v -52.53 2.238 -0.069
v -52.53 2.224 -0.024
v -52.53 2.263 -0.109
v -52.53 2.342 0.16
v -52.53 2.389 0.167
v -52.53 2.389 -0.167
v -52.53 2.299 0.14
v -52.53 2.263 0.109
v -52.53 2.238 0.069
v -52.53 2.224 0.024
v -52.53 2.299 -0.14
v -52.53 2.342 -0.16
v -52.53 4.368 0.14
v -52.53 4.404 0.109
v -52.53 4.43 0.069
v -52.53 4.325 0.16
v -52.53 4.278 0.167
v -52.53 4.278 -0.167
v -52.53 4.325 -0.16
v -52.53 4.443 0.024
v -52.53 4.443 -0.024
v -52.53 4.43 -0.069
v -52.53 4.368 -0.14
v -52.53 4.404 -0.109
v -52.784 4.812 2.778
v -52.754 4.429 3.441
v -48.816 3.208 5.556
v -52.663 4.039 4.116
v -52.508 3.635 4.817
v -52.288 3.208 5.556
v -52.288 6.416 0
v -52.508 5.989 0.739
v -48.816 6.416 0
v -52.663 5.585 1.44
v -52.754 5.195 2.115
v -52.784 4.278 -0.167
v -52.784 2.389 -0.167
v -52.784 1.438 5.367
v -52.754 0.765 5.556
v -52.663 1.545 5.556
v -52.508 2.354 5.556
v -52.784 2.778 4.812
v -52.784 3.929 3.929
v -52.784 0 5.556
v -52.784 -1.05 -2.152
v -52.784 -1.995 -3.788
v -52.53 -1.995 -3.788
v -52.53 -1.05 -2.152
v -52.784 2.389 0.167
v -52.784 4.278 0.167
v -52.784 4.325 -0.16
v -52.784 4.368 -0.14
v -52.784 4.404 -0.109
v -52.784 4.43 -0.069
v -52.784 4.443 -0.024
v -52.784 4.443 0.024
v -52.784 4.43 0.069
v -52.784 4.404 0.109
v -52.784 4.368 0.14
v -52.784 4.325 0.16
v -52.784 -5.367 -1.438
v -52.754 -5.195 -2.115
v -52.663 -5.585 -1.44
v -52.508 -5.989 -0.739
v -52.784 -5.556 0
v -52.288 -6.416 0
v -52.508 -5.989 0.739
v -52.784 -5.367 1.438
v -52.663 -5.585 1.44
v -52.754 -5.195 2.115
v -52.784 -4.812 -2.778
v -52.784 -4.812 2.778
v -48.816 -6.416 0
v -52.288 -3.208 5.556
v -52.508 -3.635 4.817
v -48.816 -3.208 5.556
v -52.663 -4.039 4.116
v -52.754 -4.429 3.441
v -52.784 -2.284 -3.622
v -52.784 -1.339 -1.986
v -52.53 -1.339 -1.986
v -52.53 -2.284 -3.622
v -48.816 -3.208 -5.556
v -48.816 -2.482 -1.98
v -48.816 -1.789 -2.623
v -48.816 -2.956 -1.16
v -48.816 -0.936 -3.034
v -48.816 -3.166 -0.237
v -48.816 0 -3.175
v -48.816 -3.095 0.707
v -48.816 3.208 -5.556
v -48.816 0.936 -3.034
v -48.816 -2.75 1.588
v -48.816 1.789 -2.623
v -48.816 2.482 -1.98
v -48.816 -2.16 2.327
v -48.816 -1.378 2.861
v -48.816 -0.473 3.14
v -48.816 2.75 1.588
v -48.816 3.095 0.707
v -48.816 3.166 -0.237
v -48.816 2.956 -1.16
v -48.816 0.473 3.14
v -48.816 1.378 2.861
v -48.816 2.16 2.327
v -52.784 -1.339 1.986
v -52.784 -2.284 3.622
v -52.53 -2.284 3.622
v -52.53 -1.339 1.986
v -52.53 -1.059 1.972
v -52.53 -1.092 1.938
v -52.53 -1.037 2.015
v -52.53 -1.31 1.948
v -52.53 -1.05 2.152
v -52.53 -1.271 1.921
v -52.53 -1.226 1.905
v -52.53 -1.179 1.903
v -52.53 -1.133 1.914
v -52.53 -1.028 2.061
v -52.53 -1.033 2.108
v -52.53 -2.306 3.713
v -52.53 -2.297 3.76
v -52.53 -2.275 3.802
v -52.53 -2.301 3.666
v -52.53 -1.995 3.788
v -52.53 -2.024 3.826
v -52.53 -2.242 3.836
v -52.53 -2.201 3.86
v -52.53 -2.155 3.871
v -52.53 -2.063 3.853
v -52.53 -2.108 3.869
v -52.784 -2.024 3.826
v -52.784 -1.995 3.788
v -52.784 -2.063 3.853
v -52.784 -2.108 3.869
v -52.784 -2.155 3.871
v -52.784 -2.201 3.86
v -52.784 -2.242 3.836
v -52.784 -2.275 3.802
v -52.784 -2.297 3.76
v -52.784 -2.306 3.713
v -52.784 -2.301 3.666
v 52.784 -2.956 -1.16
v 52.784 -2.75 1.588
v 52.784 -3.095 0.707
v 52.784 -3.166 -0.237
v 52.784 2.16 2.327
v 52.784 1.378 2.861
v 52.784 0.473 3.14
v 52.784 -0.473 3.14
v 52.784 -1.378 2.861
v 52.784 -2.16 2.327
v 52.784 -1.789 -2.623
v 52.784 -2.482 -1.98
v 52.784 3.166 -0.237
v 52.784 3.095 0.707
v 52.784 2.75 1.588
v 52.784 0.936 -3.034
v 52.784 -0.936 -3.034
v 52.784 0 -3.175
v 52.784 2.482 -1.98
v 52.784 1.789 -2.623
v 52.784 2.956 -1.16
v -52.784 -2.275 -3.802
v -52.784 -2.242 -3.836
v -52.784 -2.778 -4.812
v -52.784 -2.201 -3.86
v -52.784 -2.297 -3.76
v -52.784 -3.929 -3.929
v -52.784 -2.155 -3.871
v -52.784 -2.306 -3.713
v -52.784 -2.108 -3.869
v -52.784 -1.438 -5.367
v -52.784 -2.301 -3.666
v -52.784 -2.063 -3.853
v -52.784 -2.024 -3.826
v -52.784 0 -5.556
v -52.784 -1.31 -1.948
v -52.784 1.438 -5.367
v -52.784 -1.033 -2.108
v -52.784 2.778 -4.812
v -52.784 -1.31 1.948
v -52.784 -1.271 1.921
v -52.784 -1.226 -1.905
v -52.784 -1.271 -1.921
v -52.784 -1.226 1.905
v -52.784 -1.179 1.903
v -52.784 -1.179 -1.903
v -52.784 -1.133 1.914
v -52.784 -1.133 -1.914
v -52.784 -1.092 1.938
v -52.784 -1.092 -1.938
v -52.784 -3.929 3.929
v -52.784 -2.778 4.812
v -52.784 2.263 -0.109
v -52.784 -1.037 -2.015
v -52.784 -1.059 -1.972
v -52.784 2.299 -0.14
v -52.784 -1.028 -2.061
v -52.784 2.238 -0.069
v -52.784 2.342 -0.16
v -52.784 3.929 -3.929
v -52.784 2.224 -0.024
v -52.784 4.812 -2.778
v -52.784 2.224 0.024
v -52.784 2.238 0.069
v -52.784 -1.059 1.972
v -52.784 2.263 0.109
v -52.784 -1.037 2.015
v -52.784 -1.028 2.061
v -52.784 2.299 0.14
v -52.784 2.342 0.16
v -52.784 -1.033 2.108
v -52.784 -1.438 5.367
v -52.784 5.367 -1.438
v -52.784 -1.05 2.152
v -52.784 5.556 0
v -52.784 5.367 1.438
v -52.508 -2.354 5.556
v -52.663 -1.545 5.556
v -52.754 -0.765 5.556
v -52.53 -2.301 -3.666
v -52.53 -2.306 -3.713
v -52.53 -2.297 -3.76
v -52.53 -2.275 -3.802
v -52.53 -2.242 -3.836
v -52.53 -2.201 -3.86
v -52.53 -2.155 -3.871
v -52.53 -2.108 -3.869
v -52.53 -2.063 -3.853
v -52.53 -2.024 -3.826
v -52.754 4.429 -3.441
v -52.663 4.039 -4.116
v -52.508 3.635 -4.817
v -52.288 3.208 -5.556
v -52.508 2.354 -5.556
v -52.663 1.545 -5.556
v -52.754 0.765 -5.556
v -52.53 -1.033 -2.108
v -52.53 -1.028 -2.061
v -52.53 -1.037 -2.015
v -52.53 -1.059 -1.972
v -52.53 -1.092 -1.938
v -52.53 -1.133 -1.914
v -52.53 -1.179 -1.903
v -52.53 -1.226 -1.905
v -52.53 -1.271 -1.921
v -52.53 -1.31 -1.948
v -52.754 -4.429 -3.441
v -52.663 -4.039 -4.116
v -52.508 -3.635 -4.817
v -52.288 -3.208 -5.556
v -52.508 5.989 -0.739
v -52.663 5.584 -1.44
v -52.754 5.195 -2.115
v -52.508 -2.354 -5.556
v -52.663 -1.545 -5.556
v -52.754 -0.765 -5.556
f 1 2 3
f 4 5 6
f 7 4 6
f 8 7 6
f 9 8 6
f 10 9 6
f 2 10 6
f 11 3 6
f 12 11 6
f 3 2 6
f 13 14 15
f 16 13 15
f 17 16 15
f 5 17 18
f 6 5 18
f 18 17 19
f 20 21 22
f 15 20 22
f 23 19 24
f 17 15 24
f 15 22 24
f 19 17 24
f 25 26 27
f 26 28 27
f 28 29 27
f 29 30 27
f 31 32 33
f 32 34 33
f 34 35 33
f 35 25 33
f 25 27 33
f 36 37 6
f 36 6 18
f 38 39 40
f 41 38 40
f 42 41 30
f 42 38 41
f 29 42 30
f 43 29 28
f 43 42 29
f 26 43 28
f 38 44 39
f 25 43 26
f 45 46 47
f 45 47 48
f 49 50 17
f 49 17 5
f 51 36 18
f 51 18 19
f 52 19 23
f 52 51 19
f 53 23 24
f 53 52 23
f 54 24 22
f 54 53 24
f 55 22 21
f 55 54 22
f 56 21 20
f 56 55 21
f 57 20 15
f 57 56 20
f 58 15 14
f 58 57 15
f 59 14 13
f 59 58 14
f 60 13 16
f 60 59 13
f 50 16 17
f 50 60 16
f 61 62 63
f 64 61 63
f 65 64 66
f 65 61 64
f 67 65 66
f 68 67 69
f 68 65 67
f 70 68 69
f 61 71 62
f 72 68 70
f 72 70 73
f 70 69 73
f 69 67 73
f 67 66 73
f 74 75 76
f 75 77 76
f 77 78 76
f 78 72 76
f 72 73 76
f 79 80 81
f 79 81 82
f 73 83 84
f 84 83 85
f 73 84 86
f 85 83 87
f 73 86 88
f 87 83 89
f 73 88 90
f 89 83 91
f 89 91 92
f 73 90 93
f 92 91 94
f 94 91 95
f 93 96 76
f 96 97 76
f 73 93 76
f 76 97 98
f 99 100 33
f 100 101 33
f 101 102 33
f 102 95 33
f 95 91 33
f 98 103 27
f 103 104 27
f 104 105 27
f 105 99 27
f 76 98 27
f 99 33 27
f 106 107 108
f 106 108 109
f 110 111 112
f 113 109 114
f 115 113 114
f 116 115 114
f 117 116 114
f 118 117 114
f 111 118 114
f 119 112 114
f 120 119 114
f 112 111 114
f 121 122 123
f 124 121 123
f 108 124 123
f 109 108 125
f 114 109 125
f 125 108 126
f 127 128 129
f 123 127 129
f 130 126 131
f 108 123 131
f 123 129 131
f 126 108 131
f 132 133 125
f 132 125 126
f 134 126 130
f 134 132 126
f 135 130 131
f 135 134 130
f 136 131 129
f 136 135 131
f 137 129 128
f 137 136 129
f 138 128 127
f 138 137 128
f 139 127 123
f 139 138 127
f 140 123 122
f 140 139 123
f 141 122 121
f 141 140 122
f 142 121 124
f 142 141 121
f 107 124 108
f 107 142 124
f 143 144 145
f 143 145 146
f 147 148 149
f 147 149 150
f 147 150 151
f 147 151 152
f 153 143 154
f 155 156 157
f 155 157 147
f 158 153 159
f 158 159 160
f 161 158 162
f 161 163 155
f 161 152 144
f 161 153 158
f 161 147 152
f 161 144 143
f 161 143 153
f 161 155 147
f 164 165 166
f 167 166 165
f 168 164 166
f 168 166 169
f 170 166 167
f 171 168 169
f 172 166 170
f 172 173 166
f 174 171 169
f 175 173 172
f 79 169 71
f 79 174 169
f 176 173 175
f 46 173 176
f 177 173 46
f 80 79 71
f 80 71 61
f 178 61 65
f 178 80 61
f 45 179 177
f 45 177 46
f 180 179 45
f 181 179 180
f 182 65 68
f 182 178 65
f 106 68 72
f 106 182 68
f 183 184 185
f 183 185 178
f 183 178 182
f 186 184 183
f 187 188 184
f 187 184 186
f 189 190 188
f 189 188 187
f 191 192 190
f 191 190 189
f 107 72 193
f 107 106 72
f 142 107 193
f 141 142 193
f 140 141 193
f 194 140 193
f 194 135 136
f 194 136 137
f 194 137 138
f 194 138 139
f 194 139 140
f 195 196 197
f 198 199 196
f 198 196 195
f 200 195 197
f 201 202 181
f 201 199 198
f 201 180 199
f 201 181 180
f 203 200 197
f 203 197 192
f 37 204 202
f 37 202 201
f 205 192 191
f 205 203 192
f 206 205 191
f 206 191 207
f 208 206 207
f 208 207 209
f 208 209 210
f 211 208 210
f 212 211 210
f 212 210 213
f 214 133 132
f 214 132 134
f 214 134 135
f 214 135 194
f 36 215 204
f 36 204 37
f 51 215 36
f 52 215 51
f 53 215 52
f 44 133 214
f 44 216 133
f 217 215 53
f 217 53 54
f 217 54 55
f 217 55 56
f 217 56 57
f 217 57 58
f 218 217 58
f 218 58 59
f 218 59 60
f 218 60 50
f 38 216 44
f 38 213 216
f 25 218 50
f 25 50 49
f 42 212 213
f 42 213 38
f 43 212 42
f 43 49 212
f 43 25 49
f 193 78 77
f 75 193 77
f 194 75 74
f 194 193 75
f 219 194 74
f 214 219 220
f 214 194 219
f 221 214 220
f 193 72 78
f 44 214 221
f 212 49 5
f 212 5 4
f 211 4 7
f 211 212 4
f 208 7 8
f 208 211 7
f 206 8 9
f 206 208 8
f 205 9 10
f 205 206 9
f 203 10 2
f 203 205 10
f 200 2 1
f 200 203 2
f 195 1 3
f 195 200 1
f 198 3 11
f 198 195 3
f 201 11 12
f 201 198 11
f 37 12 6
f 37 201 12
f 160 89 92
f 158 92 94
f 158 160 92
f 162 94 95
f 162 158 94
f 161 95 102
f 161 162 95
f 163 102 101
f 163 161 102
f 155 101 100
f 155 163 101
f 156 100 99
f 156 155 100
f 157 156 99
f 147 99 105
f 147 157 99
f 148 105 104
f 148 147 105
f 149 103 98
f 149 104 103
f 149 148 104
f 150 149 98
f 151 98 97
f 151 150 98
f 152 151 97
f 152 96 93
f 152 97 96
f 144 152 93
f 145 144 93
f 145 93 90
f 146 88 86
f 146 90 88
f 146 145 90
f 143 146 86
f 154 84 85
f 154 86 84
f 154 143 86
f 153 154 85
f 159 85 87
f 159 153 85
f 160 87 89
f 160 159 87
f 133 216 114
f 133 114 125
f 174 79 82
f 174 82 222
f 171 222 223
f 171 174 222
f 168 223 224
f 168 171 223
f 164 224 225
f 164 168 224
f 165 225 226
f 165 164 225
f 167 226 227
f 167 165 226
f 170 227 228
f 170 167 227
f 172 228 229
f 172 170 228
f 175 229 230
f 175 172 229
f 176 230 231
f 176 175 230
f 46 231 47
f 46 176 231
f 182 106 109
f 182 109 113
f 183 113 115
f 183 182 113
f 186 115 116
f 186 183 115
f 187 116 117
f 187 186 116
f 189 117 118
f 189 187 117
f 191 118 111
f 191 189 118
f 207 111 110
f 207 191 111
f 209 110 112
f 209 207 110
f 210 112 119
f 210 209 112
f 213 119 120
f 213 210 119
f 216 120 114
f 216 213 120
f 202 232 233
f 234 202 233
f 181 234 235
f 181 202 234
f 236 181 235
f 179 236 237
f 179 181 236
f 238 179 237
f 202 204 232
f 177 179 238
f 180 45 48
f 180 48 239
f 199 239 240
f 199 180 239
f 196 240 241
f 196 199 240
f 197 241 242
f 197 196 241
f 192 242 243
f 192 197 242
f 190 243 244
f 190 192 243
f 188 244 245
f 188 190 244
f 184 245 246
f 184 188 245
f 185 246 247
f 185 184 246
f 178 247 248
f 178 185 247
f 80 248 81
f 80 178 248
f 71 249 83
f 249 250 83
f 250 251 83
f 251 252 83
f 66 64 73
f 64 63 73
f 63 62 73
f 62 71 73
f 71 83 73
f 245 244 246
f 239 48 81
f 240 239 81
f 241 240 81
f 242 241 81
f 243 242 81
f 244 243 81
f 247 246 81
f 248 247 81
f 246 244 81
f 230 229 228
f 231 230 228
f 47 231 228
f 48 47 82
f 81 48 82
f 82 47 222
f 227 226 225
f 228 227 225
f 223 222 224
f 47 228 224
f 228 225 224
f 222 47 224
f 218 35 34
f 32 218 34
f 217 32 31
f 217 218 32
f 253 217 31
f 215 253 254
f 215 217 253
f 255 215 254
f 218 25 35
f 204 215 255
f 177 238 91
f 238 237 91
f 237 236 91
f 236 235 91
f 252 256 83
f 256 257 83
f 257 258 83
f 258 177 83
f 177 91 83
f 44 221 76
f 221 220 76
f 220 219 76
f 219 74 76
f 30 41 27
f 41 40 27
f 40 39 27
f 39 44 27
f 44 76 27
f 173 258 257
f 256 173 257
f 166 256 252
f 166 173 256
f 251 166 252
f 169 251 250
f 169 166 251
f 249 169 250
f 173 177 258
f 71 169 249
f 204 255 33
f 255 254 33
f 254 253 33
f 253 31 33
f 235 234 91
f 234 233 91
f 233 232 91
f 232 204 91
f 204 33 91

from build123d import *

# Parameters (mm, degrees)
SKETCH5_R           = 3.175
BOSS_EXTRUDE3_DEPTH = 101.6
BOSS_EXTRUDE4_DEPTH = 3.96875
SKETCH8_OUTSIDE_W   = 404.842
SKETCH8_OUTSIDE_H   = 406.562
SKETCH8_OUTSIDE_R   = 5.55625
CUT_EXTRUDE3_DEPTH  = 106.909373724
CUT_EXTRUDE3_DRAFT  = -60
CUT_EXTRUDE4_DEPTH  = 0.254
CIRPATTERN1_COUNT   = 3


with BuildPart() as part:
    # Sketch5 → Boss-Extrude3 (new body)
    with BuildSketch(Plane(origin=(52.784375, 0, 0), x_dir=(0, 0, -1), z_dir=(1, 0, 0))):
        Circle(SKETCH5_R)
    extrude(amount=-BOSS_EXTRUDE3_DEPTH)

    # Sketch11 → Revolve1 (revolve)
    with BuildSketch(Plane.XY):
        Polygon((-48.815625, 3.175), (-48.815625, 0), (36.909375, 0), (33.734375, 3.175), align=None)
    revolve(axis=Axis((-48.815625, 0, 0), (1, 0, 0)))

    # Sketch6 → Boss-Extrude4 (add)
    with BuildSketch(Plane.ZY.offset(48.815625)):
        Polygon((5.55625, 3.207902433), (0, 6.415804866), (-5.55625, 3.207902433), (-5.55625, -3.207902433), (0, -6.415804866), (5.55625, -3.207902433), align=None)
    extrude(amount=BOSS_EXTRUDE4_DEPTH)


with BuildPart() as cut_extrude3_tool:
    # Sketch8 outside → Cut-Extrude3 (with draft: the straight prism first)
    with BuildSketch(Plane.ZY.offset(52.784375)):
        Rectangle(SKETCH8_OUTSIDE_W, SKETCH8_OUTSIDE_H)
        Circle(SKETCH8_OUTSIDE_R, mode=Mode.SUBTRACT)
    extrude(amount=-CUT_EXTRUDE3_DEPTH)
    # Cut-Extrude3: the draft: its side faces are tilted about the plane it starts from
    cut_extrude3_sides = [cut_extrude3_tool.faces().sort_by_distance(p)[0] for p in [
        (0.670311862, -203.281, 0),
        (0.670311862, 0, 202.421),
        (0.670311862, 203.281, 0),
        (0.670311862, 0, -202.421),
        (0.670311862, 0, -5.55625),
    ]]
    draft(cut_extrude3_sides, Plane.ZY.offset(52.784375), CUT_EXTRUDE3_DRAFT)


with BuildPart() as part_1:
    add(part.part)

    # Cut-Extrude3: cut by cut_extrude3_tool
    add(cut_extrude3_tool.part, mode=Mode.SUBTRACT)

    # Sketch12 → Cut-Extrude4 (cut)
    with BuildSketch(Plane.ZY.offset(52.784375)):
        with BuildLine():
            Line((0.1666875, 4.2783125), (0.1666875, 2.3891875))
            ThreePointArc((0.1666875, 2.3891875), (0, 2.2225), (-0.1666875, 2.3891875))
            Line((-0.1666875, 2.3891875), (-0.1666875, 4.2783125))
            ThreePointArc((-0.1666875, 4.2783125), (0, 4.445), (0.1666875, 4.2783125))
        make_face()
    cut_extrude4 = extrude(amount=-CUT_EXTRUDE4_DEPTH, mode=Mode.SUBTRACT)

    # CirPattern1: Cut-Extrude4 ×3 about axis
    cirpattern1_axis = Axis((0, 0, 0), (1, 0, 0))
    for i in range(1, CIRPATTERN1_COUNT):
        add(cut_extrude4.rotate(cirpattern1_axis, i * 360 / CIRPATTERN1_COUNT), mode=Mode.SUBTRACT)


solid = part_1.part
